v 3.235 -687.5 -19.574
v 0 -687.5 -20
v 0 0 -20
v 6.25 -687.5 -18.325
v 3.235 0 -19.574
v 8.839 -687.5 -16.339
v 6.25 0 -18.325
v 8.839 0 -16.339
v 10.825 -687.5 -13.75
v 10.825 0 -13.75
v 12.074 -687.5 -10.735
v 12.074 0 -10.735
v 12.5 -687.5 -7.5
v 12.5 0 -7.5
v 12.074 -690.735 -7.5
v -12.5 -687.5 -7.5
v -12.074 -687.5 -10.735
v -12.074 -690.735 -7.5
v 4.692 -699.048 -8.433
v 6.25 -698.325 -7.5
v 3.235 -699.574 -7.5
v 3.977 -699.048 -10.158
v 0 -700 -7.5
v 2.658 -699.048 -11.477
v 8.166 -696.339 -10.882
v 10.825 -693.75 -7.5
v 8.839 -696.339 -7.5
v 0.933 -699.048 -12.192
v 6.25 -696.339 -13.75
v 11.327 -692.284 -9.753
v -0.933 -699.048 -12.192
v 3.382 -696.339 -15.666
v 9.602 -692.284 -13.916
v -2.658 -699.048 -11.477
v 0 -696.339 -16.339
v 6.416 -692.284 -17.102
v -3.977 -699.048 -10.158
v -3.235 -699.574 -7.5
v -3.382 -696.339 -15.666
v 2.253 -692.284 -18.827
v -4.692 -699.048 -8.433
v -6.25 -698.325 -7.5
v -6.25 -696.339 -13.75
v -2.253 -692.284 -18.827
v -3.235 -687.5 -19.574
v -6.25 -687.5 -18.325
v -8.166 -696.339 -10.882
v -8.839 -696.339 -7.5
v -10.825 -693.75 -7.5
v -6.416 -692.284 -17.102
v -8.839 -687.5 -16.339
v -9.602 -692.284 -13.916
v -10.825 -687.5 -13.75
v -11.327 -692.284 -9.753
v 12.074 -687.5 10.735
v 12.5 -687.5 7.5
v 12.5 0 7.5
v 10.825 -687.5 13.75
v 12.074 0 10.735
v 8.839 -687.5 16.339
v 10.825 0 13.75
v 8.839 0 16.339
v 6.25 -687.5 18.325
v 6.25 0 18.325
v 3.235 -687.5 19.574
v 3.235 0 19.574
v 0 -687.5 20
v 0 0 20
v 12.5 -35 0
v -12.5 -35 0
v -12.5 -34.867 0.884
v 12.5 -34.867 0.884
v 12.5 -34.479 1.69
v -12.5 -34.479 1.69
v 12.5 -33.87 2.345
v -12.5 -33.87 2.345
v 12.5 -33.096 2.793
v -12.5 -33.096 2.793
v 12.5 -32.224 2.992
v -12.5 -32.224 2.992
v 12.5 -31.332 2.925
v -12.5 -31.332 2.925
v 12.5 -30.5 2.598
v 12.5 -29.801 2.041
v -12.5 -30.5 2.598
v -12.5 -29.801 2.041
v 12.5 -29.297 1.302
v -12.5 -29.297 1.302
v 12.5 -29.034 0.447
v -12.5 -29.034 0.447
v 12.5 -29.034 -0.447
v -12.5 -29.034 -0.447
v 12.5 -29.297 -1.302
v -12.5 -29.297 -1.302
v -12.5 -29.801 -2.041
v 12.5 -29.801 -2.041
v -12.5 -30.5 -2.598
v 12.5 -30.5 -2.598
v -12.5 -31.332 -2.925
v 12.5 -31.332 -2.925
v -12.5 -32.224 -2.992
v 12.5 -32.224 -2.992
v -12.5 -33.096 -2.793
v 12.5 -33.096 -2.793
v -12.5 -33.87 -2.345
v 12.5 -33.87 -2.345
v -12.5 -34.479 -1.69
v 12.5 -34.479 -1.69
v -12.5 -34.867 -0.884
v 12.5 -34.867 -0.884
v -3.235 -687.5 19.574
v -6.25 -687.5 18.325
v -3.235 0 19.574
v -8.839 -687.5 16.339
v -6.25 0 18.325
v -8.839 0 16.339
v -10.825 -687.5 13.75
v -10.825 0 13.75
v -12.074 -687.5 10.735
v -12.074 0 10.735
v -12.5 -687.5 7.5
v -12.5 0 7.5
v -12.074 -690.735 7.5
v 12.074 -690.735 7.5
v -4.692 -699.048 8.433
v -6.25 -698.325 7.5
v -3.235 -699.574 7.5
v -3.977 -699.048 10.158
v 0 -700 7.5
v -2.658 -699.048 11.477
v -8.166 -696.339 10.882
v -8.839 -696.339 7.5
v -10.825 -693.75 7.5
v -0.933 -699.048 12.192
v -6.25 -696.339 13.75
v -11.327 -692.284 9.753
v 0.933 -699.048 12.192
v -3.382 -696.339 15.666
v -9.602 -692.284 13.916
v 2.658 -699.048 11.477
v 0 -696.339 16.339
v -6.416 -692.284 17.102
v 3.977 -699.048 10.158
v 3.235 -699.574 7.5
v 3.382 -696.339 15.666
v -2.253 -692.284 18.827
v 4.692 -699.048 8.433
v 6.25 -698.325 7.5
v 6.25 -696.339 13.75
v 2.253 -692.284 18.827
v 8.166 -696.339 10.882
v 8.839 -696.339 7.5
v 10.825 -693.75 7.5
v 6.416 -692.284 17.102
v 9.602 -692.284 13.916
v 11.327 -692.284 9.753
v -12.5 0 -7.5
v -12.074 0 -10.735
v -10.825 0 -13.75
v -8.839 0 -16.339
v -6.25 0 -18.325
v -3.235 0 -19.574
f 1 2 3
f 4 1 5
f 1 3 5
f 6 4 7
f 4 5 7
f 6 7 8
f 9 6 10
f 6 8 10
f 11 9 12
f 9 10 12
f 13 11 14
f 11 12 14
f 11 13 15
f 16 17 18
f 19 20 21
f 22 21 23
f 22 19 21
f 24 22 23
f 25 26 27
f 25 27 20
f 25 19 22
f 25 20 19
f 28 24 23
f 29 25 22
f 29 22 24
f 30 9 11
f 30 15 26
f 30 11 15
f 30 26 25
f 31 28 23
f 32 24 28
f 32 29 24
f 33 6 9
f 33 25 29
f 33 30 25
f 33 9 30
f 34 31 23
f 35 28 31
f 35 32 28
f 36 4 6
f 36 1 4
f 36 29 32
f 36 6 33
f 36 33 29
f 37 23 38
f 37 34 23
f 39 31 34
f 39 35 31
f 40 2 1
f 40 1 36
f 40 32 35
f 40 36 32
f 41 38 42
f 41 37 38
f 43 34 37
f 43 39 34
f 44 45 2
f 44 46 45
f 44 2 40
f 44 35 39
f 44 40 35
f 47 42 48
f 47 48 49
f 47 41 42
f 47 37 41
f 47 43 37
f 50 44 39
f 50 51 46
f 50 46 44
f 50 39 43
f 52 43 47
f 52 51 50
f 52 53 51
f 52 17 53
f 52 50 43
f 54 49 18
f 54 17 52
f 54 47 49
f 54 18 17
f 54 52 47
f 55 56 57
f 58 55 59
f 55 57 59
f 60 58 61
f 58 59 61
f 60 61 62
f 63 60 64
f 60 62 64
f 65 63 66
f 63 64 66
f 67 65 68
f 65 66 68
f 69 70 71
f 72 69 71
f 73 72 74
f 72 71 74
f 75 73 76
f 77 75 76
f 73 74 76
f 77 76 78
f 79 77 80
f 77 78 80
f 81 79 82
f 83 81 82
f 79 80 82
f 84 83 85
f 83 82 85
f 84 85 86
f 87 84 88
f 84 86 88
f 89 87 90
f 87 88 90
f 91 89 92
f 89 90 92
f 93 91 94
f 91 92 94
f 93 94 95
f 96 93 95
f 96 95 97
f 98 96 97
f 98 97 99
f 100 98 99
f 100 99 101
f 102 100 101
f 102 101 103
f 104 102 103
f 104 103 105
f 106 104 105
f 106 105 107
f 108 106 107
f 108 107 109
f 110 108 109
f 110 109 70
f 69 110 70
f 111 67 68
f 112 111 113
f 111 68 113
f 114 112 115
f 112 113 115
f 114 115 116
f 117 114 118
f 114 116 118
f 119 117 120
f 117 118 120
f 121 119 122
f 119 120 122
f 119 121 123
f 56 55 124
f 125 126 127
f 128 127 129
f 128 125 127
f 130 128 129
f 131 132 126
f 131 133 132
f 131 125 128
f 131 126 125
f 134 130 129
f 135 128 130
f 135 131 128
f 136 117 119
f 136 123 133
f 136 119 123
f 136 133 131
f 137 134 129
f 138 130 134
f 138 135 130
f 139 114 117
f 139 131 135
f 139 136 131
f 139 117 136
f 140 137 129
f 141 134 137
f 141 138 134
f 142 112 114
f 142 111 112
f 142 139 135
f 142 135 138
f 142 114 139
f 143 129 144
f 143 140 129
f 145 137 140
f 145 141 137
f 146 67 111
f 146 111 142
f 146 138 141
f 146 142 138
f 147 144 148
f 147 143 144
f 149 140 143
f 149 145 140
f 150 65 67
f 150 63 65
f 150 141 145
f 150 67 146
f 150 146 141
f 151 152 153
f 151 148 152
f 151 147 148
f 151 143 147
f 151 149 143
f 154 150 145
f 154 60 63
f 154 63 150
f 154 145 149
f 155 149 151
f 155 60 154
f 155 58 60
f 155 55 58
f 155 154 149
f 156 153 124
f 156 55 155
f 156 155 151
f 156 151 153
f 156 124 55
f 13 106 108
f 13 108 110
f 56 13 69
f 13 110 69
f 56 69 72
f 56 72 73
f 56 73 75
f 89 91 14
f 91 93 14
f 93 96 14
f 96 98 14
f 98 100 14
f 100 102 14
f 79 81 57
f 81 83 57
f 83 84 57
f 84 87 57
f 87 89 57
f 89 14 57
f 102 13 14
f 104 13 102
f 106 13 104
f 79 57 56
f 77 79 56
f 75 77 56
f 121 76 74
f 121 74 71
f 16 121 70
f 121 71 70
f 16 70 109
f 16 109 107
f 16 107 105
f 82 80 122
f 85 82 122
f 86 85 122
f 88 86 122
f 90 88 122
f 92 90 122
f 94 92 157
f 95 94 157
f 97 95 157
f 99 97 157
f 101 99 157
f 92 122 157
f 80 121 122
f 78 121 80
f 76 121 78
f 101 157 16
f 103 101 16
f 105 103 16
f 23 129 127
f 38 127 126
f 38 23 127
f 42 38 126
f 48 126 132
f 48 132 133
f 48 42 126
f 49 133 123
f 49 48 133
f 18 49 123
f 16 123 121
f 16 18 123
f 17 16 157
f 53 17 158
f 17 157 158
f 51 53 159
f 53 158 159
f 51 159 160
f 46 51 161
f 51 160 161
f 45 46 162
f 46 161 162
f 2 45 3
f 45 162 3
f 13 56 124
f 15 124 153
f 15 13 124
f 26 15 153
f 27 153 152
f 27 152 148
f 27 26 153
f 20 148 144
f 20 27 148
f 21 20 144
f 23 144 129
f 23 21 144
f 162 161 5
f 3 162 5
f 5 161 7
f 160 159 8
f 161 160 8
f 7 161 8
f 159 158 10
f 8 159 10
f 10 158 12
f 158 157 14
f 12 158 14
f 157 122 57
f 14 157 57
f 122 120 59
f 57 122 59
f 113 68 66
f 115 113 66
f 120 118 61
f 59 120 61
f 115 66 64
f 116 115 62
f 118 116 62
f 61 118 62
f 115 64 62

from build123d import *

# Parameters (mm, degrees)
F1_DEPTH    = 700
F2_T1_DEPTH = 15
F2_T4_ANGLE = 180
F2_T6_ANGLE = 180
F3_R        = 3
F4_DEPTH    = 25.001


# Not quite as in the source:
# - a fillet or chamfer that OpenCascade refuses, or shapes differently, is made with other operations: its cross-section is extruded or revolved along the edge and cut away or added


with BuildPart() as f1:
    # F0 (on Front) → F1 (new body)
    with BuildSketch(Plane.XZ):
        with BuildLine():
            Line((12.5, -7.5), (12.5, 7.5))
            ThreePointArc((12.5, 7.5), (8.8388347648, 16.3388347648), (0, 20))
            ThreePointArc((0, 20), (-8.8388347648, 16.3388347648), (-12.5, 7.5))
            Line((-12.5, 7.5), (-12.5, -7.5))
            ThreePointArc((-12.5, -7.5), (-8.8388347648, -16.3388347648), (0, -20))
            ThreePointArc((0, -20), (8.8388347648, -16.3388347648), (12.5, -7.5))
        make_face()
    extrude(amount=F1_DEPTH)

    # F2: fillet of radius 12.5 on 4 edges, made by hand

    # F2_s2 → F2_t1 (cut)
    with BuildSketch(Plane.XY.offset(-7.5)):
        with BuildLine():
            ThreePointArc((12.5, -687.5), (8.8388347648, -696.3388347648), (0, -700))
            Line((0, -700), (12.5, -700))
            Line((12.5, -700), (12.5, -687.5))
        make_face()
        with BuildLine():
            ThreePointArc((0, -700), (-8.8388347648, -696.3388347648), (-12.5, -687.5))
            Line((-12.5, -687.5), (-12.5, -700))
            Line((-12.5, -700), (0, -700))
        make_face()
    extrude(amount=F2_T1_DEPTH, mode=Mode.SUBTRACT)

    # F2_s3 → F2_t4 (revolve, cut)
    with BuildSketch(Plane.XY.offset(-7.5)):
        with BuildLine():
            ThreePointArc((0, -700), (8.8388347648, -696.3388347648), (12.5, -687.5))
            Line((12.5, -687.5), (12.5, -700))
            Line((12.5, -700), (0, -700))
        make_face()
    revolve(axis=Axis((0, -700, -7.5), (0, 1, 0)), revolution_arc=F2_T4_ANGLE, mode=Mode.SUBTRACT)

    # F2_s5 → F2_t6 (revolve, cut)
    with BuildSketch(Plane.XY.offset(7.5)):
        with BuildLine():
            ThreePointArc((0, -700), (-8.8388347648, -696.3388347648), (-12.5, -687.5))
            Line((-12.5, -687.5), (-12.5, -700))
            Line((-12.5, -700), (0, -700))
        make_face()
    revolve(axis=Axis((0, -700, 7.5), (0, 1, 0)), revolution_arc=F2_T6_ANGLE, mode=Mode.SUBTRACT)

    # F3 (on face) → F4 (cut, through all)
    with BuildSketch(Plane(origin=(-12.5, 0, 0), x_dir=(0, -1, 0), z_dir=(-1, 0, 0))):
        with Locations((32, 0)):
            Circle(F3_R)
    extrude(amount=-F4_DEPTH, mode=Mode.SUBTRACT)


solid = f1.part
